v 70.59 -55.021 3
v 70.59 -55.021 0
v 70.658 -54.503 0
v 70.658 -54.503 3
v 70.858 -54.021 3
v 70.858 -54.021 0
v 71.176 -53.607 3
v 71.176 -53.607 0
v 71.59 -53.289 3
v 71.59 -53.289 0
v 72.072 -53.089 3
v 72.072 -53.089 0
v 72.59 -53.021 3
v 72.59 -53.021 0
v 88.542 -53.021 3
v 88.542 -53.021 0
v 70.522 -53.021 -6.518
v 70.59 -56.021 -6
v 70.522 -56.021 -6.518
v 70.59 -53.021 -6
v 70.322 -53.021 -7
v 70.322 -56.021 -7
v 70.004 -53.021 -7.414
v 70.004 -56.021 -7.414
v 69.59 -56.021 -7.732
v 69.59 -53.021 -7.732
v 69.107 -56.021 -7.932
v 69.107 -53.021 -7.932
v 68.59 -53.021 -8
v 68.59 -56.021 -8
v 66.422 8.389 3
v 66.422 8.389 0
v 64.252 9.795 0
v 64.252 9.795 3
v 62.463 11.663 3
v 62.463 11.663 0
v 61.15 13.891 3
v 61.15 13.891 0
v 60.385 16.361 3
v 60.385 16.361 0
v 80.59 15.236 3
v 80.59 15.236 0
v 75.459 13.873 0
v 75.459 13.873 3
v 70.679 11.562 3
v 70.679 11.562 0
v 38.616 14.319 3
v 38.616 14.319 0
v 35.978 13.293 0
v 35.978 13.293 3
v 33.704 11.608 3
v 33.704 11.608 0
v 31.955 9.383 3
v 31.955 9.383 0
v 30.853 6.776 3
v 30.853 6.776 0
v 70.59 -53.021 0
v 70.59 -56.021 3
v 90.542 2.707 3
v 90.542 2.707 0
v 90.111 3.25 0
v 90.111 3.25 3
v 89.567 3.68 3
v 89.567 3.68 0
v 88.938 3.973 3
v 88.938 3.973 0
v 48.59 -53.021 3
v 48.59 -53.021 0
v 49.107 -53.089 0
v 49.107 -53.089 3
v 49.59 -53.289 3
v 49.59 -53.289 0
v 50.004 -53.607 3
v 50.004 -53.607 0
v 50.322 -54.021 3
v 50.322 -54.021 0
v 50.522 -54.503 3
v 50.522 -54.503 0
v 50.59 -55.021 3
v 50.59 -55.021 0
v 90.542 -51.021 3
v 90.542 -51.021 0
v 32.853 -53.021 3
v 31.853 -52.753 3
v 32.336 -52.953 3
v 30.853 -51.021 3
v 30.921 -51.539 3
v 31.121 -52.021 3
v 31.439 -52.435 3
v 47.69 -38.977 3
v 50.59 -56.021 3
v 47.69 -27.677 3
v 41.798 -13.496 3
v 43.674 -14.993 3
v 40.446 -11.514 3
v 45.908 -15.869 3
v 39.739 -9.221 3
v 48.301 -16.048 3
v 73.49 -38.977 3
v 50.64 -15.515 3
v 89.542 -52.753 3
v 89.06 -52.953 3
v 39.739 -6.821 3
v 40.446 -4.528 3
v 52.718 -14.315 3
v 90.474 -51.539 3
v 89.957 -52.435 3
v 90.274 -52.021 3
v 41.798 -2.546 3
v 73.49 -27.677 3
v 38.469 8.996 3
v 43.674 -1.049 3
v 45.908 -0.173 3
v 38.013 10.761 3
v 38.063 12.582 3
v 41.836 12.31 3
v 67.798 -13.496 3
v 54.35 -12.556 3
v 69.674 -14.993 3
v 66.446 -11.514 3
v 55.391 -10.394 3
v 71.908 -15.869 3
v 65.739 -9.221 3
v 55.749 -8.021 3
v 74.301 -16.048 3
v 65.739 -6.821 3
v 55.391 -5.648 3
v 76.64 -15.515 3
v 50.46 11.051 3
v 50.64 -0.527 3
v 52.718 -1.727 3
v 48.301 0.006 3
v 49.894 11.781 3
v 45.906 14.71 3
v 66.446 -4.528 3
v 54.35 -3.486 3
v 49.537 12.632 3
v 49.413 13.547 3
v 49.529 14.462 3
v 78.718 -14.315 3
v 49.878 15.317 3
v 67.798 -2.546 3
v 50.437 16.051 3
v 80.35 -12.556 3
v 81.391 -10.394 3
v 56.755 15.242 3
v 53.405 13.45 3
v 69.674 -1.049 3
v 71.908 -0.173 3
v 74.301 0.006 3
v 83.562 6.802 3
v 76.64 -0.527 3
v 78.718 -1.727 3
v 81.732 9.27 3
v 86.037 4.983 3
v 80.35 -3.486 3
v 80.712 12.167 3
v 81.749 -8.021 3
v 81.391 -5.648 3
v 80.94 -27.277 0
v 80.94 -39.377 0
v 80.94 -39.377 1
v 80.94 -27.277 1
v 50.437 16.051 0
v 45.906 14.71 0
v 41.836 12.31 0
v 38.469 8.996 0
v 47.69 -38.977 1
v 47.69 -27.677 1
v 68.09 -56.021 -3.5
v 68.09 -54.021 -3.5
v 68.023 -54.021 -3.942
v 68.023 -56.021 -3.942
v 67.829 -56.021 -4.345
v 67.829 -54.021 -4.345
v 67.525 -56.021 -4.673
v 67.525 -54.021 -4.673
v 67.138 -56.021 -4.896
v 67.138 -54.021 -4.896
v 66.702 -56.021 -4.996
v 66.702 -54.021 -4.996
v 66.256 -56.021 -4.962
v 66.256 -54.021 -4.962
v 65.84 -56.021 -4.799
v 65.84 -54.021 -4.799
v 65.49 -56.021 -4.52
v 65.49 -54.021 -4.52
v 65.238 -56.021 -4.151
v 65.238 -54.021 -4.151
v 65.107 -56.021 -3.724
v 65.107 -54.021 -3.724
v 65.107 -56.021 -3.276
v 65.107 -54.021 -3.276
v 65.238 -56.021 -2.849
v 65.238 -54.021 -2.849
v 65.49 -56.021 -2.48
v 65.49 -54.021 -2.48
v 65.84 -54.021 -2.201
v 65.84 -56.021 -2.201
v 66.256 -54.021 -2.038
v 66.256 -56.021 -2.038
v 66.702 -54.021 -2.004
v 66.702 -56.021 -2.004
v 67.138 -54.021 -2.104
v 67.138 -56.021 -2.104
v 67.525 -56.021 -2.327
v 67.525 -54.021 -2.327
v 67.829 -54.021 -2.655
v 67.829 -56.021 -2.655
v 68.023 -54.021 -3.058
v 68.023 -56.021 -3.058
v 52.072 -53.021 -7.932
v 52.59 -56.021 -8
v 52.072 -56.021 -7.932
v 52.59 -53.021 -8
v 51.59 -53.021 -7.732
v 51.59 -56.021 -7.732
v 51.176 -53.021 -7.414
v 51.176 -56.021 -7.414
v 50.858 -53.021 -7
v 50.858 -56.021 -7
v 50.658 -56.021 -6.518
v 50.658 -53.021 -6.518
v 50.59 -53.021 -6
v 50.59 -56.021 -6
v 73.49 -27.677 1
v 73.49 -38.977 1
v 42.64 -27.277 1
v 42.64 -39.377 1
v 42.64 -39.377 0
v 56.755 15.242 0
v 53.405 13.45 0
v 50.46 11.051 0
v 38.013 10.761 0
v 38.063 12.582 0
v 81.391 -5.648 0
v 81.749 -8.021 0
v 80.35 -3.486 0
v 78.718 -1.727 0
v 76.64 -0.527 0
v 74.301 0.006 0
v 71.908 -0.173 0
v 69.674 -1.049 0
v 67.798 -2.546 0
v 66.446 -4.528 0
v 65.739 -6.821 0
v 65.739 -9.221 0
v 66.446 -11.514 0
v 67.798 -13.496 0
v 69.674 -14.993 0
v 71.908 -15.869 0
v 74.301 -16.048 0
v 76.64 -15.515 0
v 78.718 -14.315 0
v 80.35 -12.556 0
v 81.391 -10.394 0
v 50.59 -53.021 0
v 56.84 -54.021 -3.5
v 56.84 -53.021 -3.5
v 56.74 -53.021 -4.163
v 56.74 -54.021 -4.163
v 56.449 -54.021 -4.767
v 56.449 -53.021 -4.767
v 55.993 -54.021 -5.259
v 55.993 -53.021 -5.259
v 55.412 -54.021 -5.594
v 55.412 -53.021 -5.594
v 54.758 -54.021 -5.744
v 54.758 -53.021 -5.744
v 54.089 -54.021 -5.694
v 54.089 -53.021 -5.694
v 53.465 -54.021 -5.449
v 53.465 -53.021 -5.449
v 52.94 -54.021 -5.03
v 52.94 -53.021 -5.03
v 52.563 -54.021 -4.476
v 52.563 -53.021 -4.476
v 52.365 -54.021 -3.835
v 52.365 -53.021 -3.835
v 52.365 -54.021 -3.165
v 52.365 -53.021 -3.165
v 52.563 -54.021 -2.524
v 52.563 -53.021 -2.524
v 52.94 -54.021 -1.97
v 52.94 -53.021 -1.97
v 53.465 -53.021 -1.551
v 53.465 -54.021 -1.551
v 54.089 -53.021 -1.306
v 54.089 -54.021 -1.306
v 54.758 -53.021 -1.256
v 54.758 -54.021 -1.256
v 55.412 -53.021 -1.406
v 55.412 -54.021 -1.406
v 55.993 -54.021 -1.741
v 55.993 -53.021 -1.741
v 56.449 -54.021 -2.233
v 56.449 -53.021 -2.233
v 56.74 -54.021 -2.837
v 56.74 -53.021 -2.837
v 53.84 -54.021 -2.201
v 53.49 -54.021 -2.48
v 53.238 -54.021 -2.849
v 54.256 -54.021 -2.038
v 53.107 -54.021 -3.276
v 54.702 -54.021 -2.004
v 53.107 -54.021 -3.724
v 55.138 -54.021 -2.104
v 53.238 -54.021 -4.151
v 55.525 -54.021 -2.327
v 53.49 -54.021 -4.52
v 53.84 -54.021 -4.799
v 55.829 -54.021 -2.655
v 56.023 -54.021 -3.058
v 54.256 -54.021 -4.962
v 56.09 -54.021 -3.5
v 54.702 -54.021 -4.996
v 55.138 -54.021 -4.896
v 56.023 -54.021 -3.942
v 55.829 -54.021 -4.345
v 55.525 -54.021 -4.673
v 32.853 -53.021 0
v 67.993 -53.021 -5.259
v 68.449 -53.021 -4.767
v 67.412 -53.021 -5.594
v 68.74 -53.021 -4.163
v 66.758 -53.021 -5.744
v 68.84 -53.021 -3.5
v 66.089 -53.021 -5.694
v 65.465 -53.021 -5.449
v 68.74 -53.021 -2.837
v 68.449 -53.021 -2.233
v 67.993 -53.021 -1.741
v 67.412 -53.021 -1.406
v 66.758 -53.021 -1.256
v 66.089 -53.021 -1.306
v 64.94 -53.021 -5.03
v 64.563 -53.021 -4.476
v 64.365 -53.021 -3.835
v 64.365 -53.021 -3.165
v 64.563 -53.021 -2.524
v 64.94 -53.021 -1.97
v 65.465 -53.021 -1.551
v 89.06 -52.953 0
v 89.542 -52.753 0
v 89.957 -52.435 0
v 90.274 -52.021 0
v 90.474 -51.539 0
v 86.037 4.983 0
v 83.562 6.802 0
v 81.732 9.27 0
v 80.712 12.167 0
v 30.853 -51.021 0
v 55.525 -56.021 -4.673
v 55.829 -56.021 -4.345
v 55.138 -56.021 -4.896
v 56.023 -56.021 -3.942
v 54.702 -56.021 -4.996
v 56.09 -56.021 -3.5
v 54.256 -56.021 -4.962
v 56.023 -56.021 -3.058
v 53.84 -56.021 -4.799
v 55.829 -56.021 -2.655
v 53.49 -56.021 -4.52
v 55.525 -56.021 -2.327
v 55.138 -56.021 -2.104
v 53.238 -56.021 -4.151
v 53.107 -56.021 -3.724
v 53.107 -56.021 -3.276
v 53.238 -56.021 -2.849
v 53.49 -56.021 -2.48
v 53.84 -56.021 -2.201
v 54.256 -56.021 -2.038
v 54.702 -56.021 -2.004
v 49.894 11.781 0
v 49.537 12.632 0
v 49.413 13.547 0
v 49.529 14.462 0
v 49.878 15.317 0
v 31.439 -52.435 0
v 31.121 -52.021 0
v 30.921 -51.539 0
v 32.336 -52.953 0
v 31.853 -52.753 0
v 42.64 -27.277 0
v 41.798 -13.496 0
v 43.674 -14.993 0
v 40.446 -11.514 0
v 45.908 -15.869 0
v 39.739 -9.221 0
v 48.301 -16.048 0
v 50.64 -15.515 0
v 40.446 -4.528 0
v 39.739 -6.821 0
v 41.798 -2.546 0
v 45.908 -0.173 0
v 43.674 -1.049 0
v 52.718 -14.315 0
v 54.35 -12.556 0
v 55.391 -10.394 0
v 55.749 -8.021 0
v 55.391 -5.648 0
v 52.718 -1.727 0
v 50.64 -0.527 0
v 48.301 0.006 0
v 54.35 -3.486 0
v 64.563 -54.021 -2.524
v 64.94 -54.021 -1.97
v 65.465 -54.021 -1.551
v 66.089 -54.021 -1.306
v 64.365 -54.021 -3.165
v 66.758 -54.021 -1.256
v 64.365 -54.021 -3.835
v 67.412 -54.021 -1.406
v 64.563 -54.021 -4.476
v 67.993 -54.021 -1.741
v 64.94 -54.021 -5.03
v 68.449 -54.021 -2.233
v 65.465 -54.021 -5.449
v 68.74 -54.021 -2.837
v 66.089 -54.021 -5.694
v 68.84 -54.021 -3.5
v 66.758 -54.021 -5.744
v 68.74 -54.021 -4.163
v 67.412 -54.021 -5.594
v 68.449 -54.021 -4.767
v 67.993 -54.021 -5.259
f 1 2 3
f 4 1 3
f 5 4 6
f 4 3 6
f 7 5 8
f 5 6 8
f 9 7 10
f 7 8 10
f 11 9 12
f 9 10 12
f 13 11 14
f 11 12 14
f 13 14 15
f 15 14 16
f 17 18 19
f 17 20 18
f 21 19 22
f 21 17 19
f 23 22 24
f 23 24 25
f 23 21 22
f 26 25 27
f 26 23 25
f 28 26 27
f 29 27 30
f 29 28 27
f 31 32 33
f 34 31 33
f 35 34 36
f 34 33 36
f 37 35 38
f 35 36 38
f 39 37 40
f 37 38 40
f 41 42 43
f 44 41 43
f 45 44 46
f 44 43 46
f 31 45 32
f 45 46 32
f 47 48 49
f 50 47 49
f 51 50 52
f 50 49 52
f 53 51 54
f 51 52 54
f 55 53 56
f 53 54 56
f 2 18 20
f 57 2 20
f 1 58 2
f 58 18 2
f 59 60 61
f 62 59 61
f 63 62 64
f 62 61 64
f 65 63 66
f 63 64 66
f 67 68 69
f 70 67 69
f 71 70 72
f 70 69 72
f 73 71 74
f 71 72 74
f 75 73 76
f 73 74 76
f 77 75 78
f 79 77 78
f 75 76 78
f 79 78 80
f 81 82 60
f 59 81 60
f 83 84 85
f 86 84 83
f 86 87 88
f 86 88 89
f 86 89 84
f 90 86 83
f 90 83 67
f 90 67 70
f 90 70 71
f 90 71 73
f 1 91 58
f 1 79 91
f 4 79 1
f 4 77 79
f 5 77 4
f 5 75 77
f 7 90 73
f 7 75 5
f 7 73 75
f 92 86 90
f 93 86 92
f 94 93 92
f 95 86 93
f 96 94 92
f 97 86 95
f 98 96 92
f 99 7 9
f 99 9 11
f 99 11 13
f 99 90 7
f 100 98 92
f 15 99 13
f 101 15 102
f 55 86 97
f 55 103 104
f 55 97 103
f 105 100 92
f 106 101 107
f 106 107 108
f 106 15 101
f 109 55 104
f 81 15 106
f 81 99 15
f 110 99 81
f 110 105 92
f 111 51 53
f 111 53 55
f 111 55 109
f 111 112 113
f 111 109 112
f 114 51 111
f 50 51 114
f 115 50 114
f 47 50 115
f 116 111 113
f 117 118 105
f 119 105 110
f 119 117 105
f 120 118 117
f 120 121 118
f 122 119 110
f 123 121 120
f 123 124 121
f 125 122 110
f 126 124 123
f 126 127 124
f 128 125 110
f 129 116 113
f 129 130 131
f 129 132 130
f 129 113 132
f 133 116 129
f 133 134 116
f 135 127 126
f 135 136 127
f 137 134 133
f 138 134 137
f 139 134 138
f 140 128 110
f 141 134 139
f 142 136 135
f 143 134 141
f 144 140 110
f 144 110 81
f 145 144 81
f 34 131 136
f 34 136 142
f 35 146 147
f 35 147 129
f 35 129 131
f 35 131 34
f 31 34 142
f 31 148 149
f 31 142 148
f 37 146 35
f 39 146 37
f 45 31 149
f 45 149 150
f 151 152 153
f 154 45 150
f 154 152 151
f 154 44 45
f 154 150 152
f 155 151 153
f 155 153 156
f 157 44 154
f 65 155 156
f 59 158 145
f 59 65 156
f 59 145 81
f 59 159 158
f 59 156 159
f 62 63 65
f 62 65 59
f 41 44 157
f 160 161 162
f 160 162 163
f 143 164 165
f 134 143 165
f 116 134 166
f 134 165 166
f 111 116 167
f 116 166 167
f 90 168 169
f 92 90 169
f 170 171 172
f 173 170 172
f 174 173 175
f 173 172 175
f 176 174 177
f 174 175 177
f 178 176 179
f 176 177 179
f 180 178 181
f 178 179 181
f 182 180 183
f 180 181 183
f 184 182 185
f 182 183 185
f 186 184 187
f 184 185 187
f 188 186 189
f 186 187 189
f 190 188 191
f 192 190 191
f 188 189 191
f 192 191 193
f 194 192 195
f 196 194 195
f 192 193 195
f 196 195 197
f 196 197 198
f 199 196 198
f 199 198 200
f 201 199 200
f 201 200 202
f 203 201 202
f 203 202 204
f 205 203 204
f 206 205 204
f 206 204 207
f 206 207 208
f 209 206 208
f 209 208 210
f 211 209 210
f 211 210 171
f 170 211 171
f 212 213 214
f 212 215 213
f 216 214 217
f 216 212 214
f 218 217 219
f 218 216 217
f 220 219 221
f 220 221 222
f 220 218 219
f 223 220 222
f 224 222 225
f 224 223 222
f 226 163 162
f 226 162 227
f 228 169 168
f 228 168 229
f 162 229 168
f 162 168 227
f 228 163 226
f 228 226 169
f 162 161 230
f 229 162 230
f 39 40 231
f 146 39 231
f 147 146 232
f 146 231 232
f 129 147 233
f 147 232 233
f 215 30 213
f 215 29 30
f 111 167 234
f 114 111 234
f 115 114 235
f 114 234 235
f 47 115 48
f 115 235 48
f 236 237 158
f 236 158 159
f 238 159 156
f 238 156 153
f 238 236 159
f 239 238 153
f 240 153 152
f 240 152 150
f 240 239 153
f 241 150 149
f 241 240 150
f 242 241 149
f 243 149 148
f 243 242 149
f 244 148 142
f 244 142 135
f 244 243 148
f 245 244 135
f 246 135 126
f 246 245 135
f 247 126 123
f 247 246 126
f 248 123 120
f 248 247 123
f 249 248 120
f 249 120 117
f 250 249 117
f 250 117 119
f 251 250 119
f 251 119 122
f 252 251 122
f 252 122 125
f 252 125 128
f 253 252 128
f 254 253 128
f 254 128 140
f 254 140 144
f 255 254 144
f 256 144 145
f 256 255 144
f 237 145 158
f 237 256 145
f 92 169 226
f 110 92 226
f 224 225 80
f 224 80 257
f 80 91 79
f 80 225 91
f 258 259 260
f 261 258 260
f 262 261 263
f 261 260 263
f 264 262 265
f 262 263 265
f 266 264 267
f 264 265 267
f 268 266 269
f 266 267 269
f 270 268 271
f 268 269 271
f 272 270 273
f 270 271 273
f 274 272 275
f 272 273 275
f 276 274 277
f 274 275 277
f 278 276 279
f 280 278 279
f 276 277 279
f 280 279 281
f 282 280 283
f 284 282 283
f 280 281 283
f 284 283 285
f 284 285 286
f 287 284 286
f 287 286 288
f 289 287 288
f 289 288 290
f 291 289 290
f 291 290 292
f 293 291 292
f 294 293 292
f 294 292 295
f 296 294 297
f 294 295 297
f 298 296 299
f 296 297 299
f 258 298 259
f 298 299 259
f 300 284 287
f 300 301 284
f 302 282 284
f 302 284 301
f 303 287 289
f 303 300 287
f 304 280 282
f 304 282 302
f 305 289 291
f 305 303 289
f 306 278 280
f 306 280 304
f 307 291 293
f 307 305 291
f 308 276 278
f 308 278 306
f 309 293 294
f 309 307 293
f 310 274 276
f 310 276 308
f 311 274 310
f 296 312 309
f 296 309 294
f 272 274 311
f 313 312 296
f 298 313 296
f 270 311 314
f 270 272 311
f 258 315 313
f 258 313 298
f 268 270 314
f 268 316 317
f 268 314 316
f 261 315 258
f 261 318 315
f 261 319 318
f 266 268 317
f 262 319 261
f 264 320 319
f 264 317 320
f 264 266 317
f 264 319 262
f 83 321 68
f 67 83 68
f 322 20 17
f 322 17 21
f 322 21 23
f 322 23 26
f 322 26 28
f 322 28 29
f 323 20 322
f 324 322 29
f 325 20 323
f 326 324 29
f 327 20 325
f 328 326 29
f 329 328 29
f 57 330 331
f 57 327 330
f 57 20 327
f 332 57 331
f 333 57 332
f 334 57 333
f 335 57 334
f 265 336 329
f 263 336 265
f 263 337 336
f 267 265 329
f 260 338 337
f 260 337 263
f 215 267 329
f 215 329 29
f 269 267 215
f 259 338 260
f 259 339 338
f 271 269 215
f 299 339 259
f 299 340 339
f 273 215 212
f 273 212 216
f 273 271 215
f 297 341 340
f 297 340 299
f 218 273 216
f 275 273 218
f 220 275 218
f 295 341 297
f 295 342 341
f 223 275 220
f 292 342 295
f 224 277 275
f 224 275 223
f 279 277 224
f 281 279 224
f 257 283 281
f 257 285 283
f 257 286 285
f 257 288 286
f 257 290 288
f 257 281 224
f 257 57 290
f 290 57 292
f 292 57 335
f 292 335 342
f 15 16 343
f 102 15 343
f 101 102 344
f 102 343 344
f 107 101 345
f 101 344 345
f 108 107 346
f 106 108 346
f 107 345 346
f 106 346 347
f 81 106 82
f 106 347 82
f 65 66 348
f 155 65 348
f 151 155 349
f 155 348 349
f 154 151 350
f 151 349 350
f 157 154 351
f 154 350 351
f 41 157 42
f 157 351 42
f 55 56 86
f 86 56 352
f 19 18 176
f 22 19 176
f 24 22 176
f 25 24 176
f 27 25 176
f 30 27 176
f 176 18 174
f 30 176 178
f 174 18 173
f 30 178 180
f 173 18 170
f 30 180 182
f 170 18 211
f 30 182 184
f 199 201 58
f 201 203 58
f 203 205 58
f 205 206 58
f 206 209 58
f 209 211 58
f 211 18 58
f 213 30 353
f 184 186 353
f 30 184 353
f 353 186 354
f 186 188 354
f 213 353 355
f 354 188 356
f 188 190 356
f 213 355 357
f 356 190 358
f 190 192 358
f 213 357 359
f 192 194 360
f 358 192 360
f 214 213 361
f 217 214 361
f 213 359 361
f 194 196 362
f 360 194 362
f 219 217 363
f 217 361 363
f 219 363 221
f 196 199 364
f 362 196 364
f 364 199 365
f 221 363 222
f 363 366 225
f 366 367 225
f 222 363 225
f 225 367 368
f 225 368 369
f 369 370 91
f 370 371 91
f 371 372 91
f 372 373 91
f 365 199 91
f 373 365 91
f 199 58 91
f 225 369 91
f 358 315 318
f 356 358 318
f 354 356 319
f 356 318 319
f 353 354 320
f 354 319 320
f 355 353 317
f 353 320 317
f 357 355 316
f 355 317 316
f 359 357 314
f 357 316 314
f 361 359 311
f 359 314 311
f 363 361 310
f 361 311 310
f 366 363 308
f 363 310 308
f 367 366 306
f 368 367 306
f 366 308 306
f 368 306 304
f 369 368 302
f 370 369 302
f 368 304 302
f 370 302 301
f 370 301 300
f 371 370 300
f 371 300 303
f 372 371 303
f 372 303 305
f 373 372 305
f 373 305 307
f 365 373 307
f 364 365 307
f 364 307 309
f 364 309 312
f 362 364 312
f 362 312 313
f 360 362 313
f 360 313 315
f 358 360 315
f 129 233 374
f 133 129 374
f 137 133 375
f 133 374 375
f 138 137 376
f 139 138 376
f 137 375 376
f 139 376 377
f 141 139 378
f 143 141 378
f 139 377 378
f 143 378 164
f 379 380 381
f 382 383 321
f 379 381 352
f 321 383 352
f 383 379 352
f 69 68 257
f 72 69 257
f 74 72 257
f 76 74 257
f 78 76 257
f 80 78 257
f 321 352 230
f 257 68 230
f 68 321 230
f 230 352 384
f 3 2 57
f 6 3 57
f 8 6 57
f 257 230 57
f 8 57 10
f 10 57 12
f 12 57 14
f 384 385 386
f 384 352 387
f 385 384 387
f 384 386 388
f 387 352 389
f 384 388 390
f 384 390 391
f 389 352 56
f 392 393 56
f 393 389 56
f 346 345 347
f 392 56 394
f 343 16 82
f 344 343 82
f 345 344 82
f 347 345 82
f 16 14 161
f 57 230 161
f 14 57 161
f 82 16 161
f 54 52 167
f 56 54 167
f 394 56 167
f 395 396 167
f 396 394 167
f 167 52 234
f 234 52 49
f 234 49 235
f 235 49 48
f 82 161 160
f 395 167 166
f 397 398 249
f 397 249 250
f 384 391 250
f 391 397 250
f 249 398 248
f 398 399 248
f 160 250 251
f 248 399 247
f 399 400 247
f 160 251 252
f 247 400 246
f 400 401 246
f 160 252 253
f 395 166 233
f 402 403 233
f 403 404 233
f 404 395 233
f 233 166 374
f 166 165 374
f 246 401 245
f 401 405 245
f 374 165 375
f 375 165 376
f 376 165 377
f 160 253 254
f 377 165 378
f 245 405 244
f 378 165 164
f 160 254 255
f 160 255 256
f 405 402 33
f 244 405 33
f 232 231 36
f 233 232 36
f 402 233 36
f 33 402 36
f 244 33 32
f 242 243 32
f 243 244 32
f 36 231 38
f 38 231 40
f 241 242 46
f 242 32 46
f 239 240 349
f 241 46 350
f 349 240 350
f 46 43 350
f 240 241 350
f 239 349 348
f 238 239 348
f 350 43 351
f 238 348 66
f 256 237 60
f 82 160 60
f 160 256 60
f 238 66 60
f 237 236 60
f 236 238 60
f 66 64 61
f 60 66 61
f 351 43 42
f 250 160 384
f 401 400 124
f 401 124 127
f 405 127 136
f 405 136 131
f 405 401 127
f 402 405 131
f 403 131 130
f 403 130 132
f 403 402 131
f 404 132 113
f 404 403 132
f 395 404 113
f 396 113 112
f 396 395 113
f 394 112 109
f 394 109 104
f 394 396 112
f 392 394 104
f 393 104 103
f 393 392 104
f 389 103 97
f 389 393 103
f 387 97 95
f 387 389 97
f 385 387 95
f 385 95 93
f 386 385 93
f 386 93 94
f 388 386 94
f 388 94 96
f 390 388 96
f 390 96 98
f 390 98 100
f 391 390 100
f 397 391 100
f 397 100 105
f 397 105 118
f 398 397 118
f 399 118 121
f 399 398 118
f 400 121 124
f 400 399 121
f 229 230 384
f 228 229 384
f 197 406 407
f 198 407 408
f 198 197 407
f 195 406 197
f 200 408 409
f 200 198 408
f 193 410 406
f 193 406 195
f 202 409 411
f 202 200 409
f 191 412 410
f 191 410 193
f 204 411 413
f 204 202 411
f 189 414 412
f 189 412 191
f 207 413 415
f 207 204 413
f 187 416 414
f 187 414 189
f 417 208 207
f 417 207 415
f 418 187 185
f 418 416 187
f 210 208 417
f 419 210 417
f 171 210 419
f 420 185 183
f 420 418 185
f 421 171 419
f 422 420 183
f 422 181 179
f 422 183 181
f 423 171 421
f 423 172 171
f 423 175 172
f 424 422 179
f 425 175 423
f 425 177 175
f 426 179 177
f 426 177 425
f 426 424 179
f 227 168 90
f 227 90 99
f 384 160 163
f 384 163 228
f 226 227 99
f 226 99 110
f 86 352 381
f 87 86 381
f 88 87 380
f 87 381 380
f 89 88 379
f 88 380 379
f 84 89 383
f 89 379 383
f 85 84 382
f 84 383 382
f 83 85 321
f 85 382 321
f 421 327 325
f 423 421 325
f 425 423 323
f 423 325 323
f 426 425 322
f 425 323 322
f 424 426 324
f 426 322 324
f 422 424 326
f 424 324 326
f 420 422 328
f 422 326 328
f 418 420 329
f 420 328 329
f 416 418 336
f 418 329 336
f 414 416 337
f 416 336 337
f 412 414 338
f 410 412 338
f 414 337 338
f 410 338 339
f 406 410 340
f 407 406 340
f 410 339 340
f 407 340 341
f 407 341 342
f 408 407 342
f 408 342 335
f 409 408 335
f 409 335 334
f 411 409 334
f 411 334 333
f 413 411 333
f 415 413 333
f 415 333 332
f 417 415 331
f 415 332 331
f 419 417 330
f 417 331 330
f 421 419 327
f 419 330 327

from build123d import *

# Parameters (mm, degrees)
MODEL_R                 = 8.05
MODEL_W                 = 25.8
MODEL_H                 = 11.3
SALIENTE_EXTRUIR1_DEPTH = 3
CROQUIS2_W              = 20
CROQUIS2_H              = 3
SALIENTE_EXTRUIR2_DEPTH = 8
CROQUIS3_R              = 1.5
CORTAR_EXTRUIR1_DEPTH   = 3
CROQUIS4_R              = 2.25
CORTAR_EXTRUIR2_DEPTH   = 1
REDONDEO1_R             = 2
CROQUIS5_W              = 38.3
CROQUIS5_H              = 12.1
CORTAR_EXTRUIR3_DEPTH   = 1


with BuildPart() as part:
    # Model → Saliente-Extruir1 (new body)
    with BuildSketch(Plane.XY):
        with BuildLine():
            Line((50.589823504, -56.020997464), (70.589823504, -56.020997464))
            Line((70.589823504, -56.020997464), (70.589823504, -55.020997464))
            ThreePointArc((70.589823504, -55.020997464), (71.175609941, -53.606783901), (72.589823504, -53.020997464))
            Line((72.589823504, -53.020997464), (88.542347513, -53.020997464))
            ThreePointArc((88.542347513, -53.020997464), (89.956561076, -52.435211026), (90.542347513, -51.020997464))
            Line((90.542347513, -51.020997464), (90.542347513, 2.706709465))
            ThreePointArc((90.542347513, 2.706709465), (89.85153081, 3.480899542), (88.938302171, 3.973455574))
            ThreePointArc((88.938302171, 3.973455574), (82.554576883, 7.967186508), (80.590162534, 15.236499516))
            ThreePointArc((80.590162534, 15.236499516), (73.013912202, 12.831206377), (66.42202871, 8.389126209))
            ThreePointArc((66.42202871, 8.389126209), (62.462620999, 11.66270114), (60.385206297, 16.361376528))
            ThreePointArc((60.385206297, 16.361376528), (55.037159481, 14.426569266), (50.459652092, 11.051438157))
            ThreePointArc((50.459652092, 11.051438157), (49.412602259, 13.546636971), (50.436598222, 16.051385009))
            ThreePointArc((50.436598222, 16.051385009), (43.797798117, 13.634815248), (38.469001196, 8.99613013))
            ThreePointArc((38.469001196, 8.99613013), (37.974300587, 11.673196605), (38.616025483, 14.318872844))
            ThreePointArc((38.616025483, 14.318872844), (33.704473328, 11.607826814), (30.85334667, 6.776244059))
            Line((30.85334667, 6.776244059), (30.85334667, -51.020997464))
            ThreePointArc((30.85334667, -51.020997464), (31.439133108, -52.435211026), (32.85334667, -53.020997464))
            Line((32.85334667, -53.020997464), (48.589823504, -53.020997464))
            ThreePointArc((48.589823504, -53.020997464), (50.004037066, -53.606783901), (50.589823504, -55.020997464))
            Line((50.589823504, -55.020997464), (50.589823504, -56.020997464))
        make_face()
        with Locations((47.698959583, -8.020997464)):
            Circle(MODEL_R, mode=Mode.SUBTRACT)
        with Locations((73.698959582, -8.020997464)):
            Circle(MODEL_R, mode=Mode.SUBTRACT)
        with Locations((60.589823504, -33.326919867)):
            Rectangle(MODEL_W, MODEL_H, mode=Mode.SUBTRACT)
    extrude(amount=SALIENTE_EXTRUIR1_DEPTH)

    # Croquis2 → Saliente-Extruir2 (add)
    with BuildSketch(Plane(origin=(0, 0, 0), x_dir=(-1, 0, 0), z_dir=(0, 0, -1))):
        with Locations((-60.589823504, -54.520997464)):
            Rectangle(CROQUIS2_W, CROQUIS2_H)
    extrude(amount=SALIENTE_EXTRUIR2_DEPTH)

    # Croquis3 → Cortar-Extruir1 (cut)
    with BuildSketch(Plane(origin=(0, -53.020997464, 0), x_dir=(1, 0, 0), z_dir=(0, 1, 0))):
        with Locations((66.589823504, 3.5)):
            Circle(CROQUIS3_R)
        with Locations((54.589823504, 3.5)):
            Circle(CROQUIS3_R)
    extrude(amount=-CORTAR_EXTRUIR1_DEPTH, mode=Mode.SUBTRACT)

    # Croquis4 → Cortar-Extruir2 (cut)
    with BuildSketch(Plane(origin=(0, -53.020997464, 0), x_dir=(1, 0, 0), z_dir=(0, 1, 0))):
        with Locations((66.589823504, 3.5)):
            Circle(CROQUIS4_R)
        with Locations((54.589823504, 3.5)):
            Circle(CROQUIS4_R)
    extrude(amount=-CORTAR_EXTRUIR2_DEPTH, mode=Mode.SUBTRACT)

    # Redondeo1
    redondeo1_edges = [part.edges().sort_by_distance(p)[0] for p in [
        (50.589823504, -54.520997464, -8),
        (70.589823504, -54.520997464, -8),
    ]]
    fillet(redondeo1_edges, radius=REDONDEO1_R)

    # Croquis5 → Cortar-Extruir3 (cut)
    with BuildSketch(Plane(origin=(0, 0, 0), x_dir=(-1, 0, 0), z_dir=(0, 0, -1))):
        with Locations((-61.789823504, -33.326919867)):
            Rectangle(CROQUIS5_W, CROQUIS5_H)
    extrude(amount=-CORTAR_EXTRUIR3_DEPTH, mode=Mode.SUBTRACT)


solid = part.part
